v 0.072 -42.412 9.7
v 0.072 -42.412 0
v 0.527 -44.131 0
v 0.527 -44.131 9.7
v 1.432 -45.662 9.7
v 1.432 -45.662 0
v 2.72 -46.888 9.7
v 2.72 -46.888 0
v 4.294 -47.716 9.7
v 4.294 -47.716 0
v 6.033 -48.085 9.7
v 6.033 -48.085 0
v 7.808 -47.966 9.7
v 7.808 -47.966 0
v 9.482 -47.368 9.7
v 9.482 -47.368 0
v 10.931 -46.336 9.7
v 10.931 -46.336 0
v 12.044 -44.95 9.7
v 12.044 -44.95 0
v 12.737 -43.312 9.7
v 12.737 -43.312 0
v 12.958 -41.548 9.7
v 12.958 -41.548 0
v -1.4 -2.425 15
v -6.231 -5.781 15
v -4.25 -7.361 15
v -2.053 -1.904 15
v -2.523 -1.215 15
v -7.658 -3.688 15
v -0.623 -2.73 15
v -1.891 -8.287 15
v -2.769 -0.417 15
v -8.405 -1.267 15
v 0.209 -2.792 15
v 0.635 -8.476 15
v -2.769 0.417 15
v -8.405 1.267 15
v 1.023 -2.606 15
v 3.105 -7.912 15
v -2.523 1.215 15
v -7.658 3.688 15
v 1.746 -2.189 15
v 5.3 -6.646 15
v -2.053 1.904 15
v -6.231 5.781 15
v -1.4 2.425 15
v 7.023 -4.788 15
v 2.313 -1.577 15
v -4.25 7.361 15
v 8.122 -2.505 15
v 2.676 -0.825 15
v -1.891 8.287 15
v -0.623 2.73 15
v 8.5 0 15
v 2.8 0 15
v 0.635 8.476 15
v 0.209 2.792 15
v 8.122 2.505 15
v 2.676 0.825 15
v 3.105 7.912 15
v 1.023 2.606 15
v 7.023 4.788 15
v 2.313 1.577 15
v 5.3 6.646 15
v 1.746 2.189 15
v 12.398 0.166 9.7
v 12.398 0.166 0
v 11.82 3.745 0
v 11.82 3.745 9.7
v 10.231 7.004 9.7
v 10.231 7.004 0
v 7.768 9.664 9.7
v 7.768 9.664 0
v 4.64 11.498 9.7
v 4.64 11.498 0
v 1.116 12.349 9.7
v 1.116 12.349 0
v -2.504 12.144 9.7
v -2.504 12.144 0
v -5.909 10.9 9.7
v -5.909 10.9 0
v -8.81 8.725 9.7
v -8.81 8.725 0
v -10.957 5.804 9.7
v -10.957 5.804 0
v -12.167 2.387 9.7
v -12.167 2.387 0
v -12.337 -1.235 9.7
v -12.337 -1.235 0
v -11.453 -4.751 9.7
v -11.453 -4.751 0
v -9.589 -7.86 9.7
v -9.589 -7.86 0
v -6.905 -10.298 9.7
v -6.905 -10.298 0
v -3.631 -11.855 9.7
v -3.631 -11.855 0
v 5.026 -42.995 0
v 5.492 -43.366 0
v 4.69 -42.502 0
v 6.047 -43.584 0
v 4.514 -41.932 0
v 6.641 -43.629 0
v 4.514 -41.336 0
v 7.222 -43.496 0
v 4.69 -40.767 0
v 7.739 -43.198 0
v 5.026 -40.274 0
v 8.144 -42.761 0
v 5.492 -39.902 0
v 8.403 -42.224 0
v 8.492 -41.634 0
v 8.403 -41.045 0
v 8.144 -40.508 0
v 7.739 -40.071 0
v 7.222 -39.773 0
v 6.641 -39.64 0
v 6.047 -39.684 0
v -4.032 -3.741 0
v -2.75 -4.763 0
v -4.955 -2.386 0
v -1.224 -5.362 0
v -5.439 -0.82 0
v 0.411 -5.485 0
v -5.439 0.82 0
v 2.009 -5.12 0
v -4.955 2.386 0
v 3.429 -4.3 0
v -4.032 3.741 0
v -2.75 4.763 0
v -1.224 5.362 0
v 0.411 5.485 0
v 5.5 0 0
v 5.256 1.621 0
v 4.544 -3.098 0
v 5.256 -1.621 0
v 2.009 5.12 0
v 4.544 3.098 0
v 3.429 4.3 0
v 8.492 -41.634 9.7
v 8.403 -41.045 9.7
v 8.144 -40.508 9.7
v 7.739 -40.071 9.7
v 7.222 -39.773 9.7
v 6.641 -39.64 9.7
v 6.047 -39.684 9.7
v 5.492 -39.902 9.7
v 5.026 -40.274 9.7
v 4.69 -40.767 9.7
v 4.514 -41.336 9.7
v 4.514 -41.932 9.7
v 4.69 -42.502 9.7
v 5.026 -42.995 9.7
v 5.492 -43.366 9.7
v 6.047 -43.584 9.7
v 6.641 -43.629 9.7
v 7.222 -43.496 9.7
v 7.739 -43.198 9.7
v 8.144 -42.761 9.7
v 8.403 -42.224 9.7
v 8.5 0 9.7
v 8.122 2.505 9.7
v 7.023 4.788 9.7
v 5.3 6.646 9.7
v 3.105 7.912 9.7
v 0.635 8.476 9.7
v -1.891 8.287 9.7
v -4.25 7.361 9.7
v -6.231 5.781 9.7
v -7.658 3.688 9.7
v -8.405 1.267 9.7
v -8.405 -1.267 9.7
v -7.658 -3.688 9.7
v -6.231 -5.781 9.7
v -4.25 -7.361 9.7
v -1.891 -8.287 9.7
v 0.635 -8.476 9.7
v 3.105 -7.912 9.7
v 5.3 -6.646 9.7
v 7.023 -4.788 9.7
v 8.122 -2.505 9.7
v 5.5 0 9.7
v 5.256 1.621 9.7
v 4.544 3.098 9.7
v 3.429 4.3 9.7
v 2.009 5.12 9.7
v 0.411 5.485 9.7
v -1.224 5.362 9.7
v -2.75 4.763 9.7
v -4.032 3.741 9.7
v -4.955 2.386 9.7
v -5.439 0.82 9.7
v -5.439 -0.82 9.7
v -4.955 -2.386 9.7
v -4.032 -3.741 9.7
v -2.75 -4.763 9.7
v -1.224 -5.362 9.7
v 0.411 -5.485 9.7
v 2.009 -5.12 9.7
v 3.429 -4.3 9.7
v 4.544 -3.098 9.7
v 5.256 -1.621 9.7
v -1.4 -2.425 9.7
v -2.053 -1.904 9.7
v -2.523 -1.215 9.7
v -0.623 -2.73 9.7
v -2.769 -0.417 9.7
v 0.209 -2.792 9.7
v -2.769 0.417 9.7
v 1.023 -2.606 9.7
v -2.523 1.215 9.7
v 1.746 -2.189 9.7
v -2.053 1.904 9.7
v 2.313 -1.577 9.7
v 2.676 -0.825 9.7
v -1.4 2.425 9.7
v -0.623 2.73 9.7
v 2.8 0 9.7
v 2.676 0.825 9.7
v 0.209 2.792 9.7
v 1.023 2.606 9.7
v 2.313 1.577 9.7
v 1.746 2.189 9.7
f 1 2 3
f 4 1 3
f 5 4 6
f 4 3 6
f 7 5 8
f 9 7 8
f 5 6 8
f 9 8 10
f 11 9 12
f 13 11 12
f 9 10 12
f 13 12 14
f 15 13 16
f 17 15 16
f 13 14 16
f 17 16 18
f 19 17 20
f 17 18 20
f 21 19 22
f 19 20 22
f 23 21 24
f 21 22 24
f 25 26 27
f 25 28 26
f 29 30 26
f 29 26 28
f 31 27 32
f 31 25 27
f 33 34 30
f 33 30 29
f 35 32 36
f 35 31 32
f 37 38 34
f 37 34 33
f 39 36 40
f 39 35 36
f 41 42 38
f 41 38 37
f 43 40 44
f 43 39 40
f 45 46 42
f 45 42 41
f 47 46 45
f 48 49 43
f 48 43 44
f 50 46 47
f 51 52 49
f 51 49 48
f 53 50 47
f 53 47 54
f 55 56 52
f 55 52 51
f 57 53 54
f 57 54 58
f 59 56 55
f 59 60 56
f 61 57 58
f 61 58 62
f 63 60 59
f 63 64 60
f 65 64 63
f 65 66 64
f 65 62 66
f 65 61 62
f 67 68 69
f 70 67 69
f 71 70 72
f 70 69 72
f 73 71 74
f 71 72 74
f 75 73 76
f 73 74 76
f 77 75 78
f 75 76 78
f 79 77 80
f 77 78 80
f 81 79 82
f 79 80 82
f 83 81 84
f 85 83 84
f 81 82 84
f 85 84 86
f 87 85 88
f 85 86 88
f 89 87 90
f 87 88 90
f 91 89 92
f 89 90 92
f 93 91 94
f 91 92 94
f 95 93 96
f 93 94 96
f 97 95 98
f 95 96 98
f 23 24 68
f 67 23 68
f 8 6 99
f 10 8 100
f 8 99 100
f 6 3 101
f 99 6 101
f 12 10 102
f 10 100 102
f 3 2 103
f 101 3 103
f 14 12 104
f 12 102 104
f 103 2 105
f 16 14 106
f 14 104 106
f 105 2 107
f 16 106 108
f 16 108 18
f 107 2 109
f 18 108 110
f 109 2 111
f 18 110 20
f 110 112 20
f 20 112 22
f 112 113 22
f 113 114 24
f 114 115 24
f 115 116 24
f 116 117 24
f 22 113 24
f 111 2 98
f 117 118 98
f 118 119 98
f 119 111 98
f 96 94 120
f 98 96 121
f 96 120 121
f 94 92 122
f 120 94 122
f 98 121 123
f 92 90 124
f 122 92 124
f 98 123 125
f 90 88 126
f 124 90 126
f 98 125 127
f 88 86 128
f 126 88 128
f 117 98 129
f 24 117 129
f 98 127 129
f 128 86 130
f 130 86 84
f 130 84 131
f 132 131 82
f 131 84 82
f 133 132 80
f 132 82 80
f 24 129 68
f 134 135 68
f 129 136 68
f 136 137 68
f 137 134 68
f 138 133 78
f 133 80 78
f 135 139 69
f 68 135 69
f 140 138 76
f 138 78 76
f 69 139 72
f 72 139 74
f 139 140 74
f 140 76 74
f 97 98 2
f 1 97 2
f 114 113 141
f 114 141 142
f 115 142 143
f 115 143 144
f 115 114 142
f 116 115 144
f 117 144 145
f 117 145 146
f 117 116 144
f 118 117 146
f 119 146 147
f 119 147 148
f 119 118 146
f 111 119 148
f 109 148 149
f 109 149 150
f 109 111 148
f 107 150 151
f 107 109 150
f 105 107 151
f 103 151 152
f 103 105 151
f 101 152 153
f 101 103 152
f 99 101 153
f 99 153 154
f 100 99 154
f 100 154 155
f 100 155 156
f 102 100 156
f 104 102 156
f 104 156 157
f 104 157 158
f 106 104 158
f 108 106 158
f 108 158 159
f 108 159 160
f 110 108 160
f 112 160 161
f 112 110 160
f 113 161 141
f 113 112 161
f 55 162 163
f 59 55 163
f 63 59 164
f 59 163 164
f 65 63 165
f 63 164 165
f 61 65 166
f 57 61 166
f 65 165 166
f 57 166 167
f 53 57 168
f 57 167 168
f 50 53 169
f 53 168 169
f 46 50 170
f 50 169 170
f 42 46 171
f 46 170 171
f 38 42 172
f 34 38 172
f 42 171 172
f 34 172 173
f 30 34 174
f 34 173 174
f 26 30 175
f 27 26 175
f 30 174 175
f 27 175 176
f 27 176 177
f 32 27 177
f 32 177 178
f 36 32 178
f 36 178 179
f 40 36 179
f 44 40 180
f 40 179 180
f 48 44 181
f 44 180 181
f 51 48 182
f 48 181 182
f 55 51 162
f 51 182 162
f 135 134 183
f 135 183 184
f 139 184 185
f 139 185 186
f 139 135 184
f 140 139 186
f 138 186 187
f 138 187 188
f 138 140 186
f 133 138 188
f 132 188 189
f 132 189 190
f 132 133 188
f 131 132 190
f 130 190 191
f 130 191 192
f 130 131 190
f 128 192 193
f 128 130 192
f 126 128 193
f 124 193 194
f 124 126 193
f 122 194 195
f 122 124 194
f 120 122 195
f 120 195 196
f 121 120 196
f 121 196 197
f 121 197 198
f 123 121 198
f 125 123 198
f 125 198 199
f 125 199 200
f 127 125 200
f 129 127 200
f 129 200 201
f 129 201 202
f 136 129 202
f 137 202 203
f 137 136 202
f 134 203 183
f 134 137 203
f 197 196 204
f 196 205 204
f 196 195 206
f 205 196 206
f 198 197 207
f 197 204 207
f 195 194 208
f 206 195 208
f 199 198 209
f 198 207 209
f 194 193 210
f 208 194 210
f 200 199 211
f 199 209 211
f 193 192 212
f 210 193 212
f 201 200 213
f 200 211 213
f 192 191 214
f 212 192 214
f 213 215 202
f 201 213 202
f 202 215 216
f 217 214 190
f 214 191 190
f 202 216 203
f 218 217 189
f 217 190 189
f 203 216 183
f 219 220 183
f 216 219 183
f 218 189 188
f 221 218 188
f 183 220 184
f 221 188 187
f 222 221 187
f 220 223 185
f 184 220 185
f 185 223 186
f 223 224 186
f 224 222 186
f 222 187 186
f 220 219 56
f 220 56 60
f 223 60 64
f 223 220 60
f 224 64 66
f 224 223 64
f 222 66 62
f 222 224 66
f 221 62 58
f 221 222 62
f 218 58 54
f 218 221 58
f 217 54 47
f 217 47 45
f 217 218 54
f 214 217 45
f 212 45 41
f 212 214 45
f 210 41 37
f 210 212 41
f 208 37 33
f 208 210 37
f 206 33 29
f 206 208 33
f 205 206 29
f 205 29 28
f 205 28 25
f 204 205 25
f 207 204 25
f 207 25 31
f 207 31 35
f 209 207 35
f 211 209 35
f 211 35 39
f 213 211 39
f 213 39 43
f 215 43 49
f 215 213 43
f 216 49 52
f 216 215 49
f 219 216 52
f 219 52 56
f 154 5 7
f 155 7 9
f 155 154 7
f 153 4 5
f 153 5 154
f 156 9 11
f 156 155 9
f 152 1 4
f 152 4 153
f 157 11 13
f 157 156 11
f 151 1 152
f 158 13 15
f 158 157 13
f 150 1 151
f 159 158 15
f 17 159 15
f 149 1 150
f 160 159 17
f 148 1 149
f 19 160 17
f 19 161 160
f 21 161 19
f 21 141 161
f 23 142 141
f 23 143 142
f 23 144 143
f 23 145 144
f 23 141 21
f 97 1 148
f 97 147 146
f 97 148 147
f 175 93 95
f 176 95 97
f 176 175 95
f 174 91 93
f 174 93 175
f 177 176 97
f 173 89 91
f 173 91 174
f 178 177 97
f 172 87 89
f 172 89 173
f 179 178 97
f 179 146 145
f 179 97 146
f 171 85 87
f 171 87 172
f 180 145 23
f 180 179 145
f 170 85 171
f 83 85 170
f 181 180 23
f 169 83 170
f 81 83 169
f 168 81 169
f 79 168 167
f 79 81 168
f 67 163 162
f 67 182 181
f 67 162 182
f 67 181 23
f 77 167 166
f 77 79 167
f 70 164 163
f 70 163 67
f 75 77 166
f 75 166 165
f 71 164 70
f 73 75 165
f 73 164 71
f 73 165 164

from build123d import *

# Parameters (mm, degrees)
ESBO_O1_R                = 2
ESBO_O1_R_2              = 5.5
RESSALTO_EXTRUS_O1_DEPTH = 9.7
ESBO_O2_R                = 8.5
ESBO_O2_R_2              = 2.8
RESSALTO_EXTRUS_O2_DEPTH = 5.3


with BuildPart() as part:
    # Esboço1 → Ressalto-extrusão1 (new body)
    with BuildSketch(Plane.XY):
        with BuildLine():
            Line((-3.631457669, -11.855371335), (0.071926714, -42.412329846))
            ThreePointArc((0.071926714, -42.412329846), (6.924703408, -48.086484209), (12.957802317, -41.547501589))
            Line((12.957802317, -41.547501589), (12.397968723, 0.166390596))
            ThreePointArc((12.397968723, 0.166390596), (-7.439329204, 9.919359621), (-3.631457669, -11.855371335))
        make_face()
        with Locations((6.491667521, -41.634282258)):
            Circle(ESBO_O1_R, mode=Mode.SUBTRACT)
        Circle(ESBO_O1_R_2, mode=Mode.SUBTRACT)
    extrude(amount=RESSALTO_EXTRUS_O1_DEPTH)

    # Esboço2 → Ressalto-extrusão2 (add)
    with BuildSketch(Plane.XY.offset(9.7)):
        Circle(ESBO_O2_R)
        Circle(ESBO_O2_R_2, mode=Mode.SUBTRACT)
    extrude(amount=RESSALTO_EXTRUS_O2_DEPTH)


solid = part.part
